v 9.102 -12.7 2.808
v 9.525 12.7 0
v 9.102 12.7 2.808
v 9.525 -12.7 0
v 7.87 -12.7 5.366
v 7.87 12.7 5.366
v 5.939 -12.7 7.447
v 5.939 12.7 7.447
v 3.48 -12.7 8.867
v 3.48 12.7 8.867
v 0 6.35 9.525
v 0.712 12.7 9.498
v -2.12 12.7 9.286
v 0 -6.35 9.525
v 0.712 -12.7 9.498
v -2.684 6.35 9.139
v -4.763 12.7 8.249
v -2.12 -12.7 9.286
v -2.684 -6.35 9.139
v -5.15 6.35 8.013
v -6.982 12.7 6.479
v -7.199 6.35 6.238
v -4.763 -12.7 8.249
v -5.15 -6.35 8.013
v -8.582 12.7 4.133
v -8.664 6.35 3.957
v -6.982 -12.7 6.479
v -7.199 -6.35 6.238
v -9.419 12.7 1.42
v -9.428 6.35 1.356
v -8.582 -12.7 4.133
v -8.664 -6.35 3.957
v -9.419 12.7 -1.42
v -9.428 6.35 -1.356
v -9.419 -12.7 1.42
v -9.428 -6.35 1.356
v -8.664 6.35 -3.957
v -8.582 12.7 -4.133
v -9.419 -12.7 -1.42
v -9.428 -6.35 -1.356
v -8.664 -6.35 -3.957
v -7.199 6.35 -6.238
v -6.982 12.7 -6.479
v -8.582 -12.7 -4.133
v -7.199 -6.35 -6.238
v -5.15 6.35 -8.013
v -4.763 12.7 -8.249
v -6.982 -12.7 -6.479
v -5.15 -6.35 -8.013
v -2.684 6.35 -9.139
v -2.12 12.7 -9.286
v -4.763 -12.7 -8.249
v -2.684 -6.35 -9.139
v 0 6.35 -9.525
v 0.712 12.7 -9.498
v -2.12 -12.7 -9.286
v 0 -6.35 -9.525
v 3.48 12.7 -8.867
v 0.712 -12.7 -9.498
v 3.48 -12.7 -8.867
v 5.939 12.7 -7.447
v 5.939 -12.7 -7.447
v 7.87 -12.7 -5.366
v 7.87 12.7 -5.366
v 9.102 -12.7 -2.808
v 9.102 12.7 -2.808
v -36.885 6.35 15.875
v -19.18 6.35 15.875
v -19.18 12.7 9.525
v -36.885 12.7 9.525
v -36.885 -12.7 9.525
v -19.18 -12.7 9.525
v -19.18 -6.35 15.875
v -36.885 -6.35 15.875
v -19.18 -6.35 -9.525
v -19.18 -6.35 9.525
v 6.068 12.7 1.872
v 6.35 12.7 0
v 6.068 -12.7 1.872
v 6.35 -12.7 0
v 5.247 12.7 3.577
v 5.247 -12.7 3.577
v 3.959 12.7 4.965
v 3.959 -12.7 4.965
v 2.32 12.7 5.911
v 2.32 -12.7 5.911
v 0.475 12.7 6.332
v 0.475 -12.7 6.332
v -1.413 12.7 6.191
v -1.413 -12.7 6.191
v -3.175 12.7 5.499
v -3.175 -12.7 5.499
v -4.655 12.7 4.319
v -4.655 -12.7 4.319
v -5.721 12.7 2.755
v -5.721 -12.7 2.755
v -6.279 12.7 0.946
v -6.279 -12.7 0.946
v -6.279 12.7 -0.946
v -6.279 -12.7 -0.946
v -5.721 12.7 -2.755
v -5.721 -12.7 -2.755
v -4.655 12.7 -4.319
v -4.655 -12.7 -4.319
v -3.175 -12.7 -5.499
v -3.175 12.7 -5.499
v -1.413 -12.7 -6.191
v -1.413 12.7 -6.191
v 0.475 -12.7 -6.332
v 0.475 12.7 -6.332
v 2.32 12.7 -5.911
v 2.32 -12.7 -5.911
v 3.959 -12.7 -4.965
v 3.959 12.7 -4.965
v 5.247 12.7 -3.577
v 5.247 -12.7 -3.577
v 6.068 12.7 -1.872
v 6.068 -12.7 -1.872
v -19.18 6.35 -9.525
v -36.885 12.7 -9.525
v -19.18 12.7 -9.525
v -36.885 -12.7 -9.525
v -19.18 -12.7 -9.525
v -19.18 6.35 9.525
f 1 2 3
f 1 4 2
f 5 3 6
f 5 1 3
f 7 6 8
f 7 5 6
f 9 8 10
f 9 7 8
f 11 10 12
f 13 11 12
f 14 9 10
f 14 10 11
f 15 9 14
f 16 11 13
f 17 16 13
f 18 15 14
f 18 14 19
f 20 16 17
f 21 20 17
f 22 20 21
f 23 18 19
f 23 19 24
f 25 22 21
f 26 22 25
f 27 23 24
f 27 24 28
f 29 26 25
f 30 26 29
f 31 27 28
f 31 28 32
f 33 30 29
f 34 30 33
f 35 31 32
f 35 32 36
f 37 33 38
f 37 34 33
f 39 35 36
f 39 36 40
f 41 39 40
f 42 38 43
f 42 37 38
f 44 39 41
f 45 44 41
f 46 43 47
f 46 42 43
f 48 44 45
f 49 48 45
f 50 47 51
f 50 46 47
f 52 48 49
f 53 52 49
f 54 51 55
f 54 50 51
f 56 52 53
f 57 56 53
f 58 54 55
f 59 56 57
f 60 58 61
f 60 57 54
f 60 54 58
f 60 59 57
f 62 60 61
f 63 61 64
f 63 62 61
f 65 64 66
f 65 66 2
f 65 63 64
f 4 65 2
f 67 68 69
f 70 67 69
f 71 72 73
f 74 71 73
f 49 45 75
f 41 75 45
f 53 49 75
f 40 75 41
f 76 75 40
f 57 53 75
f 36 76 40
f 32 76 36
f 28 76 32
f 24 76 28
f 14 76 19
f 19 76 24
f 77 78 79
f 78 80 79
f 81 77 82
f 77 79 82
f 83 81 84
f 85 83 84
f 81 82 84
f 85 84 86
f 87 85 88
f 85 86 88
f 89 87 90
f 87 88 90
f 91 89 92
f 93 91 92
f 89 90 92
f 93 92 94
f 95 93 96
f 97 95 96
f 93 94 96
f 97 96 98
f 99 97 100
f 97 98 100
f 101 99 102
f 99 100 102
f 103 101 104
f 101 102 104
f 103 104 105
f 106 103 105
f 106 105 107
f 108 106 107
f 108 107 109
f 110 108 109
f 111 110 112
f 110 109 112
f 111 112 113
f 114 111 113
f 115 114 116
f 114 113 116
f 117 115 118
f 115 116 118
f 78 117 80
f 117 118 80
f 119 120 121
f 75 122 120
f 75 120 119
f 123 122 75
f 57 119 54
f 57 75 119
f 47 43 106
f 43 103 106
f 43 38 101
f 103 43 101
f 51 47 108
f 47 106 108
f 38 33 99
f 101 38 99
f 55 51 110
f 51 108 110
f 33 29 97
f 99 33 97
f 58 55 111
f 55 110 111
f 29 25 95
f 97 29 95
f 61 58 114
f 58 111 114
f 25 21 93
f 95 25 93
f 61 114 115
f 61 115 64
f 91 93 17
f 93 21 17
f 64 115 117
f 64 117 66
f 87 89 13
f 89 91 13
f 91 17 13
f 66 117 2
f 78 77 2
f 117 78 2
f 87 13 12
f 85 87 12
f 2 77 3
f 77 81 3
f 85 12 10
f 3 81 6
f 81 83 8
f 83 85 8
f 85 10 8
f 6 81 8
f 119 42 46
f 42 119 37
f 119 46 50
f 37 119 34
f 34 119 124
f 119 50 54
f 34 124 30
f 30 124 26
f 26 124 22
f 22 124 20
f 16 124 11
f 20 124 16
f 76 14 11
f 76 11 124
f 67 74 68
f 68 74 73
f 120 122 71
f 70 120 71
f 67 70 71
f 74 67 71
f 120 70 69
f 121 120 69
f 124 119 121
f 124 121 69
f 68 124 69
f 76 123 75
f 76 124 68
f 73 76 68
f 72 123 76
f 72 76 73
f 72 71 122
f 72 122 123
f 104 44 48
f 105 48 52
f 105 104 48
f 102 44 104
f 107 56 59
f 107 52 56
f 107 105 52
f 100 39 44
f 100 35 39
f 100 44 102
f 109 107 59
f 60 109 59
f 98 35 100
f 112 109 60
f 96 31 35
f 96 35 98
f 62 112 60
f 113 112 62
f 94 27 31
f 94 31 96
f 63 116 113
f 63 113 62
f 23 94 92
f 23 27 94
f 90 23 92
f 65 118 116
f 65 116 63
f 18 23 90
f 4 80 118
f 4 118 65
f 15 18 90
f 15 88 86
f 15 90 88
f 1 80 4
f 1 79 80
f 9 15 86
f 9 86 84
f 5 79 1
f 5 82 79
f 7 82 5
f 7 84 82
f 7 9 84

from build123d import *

# Parameters (mm, degrees)
F0_R     = 9.525
F1_DEPTH = 12.7
F2_R     = 6.35
F3_DEPTH = 12.7
F5_DEPTH = 6.35
F6_W     = 17.704927
F6_H     = 25.4
F7_DEPTH = 12.7
F9_DEPTH = 38.1


with BuildPart() as f1:
    # F0 (on Front) → F1 (new body, symmetric)
    with BuildSketch(Plane.XZ):
        Circle(F0_R)
    extrude(amount=F1_DEPTH, both=True)

    # F2 (on Front) → F3 (cut, symmetric)
    with BuildSketch(Plane.XZ):
        Circle(F2_R)
    extrude(amount=F3_DEPTH, both=True, mode=Mode.SUBTRACT)

    # F4 (on Front) → F5 (join, symmetric)
    with BuildSketch(Plane.XZ):
        with BuildLine():
            ThreePointArc((0, -9.525), (-9.525, 0), (0, 9.525))
            Line((0, 9.525), (-19.180335, 9.525))
            Line((-19.180335, 9.525), (-19.180335, -9.525))
            Line((-19.180335, -9.525), (0, -9.525))
        make_face()
    extrude(amount=F5_DEPTH, both=True)

    # F6 (on Front) → F7 (join, symmetric)
    with BuildSketch(Plane.XZ):
        with Locations((-28.032798, 3.175)):
            Rectangle(F6_W, F6_H)
    extrude(amount=F7_DEPTH, both=True)

    # F8 (on Right) → F9 (cut)
    with BuildSketch(Plane.YZ):
        Polygon((12.7, 9.525), (12.7, 15.875), (6.35, 15.875), align=None)
        Polygon((-6.35, 15.875), (-12.7, 15.875), (-12.7, 9.525), align=None)
    extrude(amount=-F9_DEPTH, mode=Mode.SUBTRACT)


solid = f1.part
